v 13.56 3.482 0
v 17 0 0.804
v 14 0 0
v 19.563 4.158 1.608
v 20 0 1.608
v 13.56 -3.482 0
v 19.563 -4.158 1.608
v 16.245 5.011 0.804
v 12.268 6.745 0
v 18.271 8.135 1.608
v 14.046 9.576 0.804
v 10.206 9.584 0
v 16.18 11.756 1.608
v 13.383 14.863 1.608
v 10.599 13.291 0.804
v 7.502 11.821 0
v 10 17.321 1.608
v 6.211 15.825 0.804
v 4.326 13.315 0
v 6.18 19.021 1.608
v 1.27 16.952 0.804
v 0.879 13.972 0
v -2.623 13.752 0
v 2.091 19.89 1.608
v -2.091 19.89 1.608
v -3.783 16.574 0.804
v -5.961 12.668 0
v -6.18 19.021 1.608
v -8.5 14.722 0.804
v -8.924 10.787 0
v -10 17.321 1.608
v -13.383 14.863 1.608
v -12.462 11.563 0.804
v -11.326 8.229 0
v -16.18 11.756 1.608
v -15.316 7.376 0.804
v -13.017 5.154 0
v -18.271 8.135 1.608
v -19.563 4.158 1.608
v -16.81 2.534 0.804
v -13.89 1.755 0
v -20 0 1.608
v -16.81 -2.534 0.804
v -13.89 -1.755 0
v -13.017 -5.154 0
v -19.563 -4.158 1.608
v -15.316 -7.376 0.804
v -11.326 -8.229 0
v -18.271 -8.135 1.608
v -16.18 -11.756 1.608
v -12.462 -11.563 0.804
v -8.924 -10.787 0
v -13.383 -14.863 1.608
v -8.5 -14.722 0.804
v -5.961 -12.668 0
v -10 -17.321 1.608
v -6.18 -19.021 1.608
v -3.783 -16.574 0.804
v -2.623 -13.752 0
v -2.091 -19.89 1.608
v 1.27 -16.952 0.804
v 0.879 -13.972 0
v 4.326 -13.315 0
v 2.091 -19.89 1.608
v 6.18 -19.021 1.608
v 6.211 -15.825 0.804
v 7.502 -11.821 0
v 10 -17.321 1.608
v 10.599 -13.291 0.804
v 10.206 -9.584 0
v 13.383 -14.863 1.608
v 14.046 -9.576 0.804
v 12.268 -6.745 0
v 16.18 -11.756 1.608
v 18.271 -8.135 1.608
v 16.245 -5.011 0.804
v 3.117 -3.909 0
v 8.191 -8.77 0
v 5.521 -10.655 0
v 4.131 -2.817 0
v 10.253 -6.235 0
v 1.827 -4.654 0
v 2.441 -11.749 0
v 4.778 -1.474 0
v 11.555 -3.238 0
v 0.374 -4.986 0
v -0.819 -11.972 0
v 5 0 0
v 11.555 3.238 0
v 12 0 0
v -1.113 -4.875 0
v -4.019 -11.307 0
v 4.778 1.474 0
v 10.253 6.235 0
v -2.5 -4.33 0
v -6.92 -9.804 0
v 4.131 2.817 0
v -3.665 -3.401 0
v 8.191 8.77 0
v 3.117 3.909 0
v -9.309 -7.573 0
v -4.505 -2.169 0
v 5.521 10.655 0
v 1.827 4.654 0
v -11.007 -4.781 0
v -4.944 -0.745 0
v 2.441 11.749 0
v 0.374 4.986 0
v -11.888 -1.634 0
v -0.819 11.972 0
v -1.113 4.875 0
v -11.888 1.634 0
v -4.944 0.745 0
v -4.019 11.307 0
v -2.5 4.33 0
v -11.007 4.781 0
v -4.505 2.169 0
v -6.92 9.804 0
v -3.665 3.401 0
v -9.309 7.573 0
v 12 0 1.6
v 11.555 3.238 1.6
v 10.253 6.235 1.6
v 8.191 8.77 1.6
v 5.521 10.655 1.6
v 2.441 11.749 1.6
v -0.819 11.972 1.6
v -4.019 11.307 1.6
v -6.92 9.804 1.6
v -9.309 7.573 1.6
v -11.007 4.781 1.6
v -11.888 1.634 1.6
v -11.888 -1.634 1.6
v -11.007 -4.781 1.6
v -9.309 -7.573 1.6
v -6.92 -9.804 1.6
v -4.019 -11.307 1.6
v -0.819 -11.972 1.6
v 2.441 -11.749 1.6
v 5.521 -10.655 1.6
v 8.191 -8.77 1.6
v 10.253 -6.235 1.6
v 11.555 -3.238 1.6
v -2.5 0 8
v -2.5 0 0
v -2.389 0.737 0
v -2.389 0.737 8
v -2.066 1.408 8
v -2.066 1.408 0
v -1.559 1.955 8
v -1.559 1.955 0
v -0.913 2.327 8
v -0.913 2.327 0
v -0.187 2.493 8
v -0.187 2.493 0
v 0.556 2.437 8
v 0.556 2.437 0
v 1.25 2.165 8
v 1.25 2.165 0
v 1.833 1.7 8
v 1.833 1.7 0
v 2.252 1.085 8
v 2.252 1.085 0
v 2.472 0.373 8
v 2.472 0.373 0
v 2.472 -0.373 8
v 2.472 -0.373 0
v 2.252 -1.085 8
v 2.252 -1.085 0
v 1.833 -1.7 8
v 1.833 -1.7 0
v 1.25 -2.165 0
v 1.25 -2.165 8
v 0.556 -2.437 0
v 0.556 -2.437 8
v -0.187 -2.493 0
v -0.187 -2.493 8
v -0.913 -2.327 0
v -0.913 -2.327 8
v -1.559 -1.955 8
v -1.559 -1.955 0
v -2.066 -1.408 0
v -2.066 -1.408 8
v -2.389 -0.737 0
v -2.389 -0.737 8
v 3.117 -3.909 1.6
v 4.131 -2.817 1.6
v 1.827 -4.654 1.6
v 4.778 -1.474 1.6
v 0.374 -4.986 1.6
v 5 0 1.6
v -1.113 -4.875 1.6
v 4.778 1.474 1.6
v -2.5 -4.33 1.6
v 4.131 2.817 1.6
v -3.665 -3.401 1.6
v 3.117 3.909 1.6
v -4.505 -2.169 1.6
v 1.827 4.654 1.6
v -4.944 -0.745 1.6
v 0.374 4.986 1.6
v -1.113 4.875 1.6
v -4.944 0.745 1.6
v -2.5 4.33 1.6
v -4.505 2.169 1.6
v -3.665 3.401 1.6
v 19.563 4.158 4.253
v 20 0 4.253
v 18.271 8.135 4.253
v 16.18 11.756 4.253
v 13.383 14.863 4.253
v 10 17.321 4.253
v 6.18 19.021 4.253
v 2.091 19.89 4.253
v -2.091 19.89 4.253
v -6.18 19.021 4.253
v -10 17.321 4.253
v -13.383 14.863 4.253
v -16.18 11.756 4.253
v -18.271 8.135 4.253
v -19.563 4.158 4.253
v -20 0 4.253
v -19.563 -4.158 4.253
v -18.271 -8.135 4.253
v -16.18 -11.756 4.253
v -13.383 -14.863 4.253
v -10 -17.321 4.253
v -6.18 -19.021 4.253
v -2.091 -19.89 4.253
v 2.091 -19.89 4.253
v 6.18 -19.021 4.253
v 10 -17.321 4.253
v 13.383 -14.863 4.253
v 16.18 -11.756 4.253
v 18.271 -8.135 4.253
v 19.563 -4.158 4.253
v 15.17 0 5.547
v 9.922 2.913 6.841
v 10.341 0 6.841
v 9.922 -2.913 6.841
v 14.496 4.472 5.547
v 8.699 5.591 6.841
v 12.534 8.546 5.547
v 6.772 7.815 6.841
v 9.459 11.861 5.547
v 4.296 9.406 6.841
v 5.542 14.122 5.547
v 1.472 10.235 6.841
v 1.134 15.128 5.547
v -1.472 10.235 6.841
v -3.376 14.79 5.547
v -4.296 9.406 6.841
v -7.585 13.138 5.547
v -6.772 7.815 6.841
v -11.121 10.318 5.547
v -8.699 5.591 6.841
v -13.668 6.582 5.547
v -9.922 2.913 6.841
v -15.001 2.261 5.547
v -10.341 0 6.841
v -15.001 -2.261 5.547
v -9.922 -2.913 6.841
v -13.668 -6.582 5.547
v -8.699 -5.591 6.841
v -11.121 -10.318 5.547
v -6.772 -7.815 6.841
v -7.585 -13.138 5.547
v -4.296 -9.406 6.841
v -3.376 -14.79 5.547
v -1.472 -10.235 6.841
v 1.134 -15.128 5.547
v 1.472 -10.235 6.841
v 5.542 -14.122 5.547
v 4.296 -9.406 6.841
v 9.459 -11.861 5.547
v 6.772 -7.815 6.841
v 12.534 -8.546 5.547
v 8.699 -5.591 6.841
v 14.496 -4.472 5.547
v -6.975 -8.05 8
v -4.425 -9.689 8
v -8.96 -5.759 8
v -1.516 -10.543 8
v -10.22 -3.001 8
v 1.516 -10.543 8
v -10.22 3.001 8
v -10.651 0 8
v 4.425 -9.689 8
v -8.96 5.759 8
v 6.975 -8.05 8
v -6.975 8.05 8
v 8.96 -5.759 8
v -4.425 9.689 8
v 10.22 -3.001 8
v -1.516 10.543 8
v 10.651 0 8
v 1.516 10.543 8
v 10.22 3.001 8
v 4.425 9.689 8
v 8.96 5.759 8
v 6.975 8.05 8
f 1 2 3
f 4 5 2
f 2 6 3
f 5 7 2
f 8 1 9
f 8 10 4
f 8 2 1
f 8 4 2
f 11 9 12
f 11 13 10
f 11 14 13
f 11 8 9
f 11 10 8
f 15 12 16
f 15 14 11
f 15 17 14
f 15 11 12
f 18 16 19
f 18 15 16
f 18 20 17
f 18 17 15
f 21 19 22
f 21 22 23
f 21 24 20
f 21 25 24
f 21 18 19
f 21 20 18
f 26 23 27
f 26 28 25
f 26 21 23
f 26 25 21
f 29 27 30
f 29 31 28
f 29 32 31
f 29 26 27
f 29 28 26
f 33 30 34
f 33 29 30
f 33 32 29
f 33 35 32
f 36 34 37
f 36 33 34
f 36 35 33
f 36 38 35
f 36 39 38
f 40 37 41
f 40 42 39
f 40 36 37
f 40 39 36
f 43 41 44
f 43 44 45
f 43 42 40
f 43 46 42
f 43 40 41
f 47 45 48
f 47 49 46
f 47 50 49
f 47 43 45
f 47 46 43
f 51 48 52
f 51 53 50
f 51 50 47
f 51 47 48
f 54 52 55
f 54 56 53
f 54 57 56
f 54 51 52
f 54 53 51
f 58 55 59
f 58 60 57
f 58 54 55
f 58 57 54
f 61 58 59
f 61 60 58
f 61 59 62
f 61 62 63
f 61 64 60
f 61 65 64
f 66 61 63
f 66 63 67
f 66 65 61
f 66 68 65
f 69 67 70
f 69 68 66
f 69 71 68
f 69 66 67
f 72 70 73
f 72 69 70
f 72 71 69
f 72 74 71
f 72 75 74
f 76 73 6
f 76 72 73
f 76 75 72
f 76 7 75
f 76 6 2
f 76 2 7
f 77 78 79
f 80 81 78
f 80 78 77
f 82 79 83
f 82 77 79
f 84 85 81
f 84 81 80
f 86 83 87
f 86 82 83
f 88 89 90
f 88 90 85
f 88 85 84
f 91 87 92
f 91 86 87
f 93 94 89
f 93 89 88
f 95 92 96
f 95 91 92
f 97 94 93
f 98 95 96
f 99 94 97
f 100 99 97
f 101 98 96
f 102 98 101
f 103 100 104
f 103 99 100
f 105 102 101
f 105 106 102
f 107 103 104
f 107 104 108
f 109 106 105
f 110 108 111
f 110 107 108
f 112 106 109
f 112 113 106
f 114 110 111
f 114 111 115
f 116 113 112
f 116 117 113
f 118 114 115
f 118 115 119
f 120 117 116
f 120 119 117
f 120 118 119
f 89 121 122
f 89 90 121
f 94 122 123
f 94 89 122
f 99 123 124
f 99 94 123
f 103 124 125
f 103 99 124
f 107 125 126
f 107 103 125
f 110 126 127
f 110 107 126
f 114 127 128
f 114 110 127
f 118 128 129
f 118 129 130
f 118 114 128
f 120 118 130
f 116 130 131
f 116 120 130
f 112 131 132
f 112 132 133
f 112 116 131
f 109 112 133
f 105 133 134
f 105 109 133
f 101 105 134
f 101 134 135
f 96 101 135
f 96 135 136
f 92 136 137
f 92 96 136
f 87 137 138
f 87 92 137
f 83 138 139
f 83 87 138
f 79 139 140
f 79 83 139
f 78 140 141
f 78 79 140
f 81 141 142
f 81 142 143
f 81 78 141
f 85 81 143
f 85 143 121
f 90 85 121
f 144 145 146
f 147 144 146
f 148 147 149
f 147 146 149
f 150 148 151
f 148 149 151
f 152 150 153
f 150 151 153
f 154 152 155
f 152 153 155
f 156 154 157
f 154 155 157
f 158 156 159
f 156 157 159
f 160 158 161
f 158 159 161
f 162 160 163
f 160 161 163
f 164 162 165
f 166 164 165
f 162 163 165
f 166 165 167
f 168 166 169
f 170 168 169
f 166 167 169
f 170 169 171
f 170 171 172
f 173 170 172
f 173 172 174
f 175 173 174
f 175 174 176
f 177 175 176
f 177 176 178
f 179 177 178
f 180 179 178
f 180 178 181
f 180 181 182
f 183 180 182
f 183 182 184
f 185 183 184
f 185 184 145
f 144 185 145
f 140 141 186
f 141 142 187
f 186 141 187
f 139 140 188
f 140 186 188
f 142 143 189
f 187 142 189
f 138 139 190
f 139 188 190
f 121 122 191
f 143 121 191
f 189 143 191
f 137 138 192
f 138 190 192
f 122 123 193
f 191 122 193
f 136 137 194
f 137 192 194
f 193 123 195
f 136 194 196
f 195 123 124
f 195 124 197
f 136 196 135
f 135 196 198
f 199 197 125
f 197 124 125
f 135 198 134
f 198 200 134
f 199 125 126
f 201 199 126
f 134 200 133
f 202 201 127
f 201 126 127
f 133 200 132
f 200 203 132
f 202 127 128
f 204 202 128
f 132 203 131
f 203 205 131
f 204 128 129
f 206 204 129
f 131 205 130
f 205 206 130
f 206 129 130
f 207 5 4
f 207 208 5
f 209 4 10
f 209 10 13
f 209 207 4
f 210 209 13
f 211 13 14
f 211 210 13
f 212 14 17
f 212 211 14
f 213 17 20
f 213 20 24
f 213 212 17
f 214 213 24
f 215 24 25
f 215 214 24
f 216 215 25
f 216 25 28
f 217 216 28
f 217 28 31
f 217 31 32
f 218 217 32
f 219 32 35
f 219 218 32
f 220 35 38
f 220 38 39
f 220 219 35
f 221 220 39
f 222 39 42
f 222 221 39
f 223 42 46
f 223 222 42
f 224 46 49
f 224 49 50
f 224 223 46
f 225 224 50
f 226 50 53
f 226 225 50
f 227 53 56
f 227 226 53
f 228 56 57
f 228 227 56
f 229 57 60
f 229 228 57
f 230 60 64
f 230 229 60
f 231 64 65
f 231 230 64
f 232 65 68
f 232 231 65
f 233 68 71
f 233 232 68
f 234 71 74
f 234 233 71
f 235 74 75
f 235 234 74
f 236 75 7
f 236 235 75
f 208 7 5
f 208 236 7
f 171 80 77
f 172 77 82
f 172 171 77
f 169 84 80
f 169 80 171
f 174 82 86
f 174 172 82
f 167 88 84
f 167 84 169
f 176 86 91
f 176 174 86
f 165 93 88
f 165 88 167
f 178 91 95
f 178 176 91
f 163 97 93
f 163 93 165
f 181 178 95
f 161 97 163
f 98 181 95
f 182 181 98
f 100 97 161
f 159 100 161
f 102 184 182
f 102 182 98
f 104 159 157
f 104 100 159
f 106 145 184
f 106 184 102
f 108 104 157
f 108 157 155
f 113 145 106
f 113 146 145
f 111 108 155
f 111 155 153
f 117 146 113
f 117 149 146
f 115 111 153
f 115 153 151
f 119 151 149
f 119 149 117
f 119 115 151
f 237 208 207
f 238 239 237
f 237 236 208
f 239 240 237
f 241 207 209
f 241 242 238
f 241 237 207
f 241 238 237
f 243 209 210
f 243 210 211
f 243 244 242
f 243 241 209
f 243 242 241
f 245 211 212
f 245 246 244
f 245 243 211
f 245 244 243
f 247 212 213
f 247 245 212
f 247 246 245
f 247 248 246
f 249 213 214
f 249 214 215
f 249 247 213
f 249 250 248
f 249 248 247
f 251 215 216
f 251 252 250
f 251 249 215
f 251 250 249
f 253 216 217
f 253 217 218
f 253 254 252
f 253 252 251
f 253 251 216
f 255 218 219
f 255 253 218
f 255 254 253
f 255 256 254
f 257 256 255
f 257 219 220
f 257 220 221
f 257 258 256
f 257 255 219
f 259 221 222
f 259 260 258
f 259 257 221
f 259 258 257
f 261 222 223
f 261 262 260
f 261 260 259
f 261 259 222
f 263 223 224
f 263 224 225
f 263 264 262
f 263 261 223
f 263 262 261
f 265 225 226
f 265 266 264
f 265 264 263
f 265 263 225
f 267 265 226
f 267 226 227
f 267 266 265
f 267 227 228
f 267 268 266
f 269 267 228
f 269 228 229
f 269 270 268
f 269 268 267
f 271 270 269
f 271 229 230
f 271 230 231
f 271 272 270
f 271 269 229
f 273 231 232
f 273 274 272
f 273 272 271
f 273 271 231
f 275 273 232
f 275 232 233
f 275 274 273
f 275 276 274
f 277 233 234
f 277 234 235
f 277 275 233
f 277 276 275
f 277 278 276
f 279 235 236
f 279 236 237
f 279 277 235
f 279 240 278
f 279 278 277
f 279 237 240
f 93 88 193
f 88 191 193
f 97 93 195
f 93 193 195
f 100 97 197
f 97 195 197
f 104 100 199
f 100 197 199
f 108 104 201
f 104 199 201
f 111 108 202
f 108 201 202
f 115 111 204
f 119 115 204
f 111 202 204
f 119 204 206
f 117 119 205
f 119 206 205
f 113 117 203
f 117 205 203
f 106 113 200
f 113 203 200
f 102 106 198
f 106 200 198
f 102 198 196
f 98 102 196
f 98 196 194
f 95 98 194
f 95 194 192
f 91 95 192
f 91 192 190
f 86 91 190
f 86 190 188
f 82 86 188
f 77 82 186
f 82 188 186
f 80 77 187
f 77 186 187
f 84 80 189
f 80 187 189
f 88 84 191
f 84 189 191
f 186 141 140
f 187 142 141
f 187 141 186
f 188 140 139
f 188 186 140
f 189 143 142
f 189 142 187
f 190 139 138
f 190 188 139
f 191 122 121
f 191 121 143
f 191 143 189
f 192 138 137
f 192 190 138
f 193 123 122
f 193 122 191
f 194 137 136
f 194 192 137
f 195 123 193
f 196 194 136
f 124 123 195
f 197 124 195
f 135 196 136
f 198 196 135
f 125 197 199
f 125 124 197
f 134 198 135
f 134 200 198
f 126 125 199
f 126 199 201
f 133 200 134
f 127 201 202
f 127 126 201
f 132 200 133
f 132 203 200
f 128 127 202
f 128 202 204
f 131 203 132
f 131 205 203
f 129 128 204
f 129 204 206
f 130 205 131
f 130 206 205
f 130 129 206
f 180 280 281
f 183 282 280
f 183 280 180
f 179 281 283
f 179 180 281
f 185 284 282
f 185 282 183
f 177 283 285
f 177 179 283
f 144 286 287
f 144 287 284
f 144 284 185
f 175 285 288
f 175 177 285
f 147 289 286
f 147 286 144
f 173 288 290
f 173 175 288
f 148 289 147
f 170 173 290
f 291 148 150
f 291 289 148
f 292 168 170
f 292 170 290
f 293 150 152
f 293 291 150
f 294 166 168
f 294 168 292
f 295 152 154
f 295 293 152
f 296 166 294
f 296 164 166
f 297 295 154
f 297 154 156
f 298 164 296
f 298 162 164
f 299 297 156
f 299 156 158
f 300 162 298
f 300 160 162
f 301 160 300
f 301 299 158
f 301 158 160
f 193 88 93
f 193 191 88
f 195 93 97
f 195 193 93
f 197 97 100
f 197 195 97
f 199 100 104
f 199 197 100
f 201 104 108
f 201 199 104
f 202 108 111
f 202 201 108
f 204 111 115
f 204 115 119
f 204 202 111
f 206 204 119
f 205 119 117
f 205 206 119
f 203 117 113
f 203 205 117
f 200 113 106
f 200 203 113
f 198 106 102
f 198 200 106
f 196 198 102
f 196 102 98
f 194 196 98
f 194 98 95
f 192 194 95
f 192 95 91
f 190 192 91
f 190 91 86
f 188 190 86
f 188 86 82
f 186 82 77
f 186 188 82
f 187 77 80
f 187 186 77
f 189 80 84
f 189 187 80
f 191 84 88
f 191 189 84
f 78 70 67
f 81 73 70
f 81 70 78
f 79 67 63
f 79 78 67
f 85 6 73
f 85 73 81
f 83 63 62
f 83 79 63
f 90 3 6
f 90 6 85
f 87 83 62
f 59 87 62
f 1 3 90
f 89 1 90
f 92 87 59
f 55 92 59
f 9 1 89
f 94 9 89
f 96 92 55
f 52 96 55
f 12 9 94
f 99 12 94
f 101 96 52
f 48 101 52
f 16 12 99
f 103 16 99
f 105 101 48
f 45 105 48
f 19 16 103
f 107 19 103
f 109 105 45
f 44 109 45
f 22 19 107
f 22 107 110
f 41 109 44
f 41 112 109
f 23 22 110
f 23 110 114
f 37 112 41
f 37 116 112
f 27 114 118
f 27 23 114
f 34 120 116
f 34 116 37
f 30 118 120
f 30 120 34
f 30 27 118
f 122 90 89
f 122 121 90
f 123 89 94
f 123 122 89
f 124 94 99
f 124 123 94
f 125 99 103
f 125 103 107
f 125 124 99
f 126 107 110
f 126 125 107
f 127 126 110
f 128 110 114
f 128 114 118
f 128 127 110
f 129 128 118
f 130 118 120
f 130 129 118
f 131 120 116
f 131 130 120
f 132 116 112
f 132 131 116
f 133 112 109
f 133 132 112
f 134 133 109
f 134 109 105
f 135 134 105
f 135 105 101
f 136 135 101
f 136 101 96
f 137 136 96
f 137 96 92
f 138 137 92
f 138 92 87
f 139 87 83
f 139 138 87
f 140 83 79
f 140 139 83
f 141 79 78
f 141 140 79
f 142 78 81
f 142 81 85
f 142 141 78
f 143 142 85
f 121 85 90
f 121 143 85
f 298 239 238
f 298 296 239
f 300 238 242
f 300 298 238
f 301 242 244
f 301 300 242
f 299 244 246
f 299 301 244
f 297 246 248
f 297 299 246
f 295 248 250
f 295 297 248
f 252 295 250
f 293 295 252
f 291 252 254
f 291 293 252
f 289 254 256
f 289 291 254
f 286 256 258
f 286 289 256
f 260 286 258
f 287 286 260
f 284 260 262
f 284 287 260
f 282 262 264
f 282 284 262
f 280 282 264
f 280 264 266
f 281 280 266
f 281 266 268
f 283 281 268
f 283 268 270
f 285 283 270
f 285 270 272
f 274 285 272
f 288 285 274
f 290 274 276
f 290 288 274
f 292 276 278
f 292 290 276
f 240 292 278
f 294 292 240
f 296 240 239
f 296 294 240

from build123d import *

# Parameters (mm, degrees)
F0_W   = 7
F0_H   = 1.6
F0_W_2 = 5
F4_D   = 5


with BuildPart() as f1:
    # F0 (on Front) → F1 (revolve)
    with BuildSketch(Plane.XZ):
        with Locations((8.5, 0.8)):
            Rectangle(F0_W, F0_H)
    revolve(axis=Axis((0, 0, 0.8), (0, 0, 1)))


with BuildPart() as f2:
    # F0 (on Front) → F2 (revolve)
    with BuildSketch(Plane.XZ):
        Polygon((0, 8), (0, 1.6), (5, 1.6), (12, 1.6), (12, 0), (14, 0), (20, 1.6076951546), (20, 4.2526985574), (10.3407417371, 6.8408890085), (6.014880625, 8), align=None)
        with Locations((2.5, 0.8)):
            Rectangle(F0_W_2, F0_H)
        Polygon((10.6513245912, 8), (6.014880625, 8), (10.3407417371, 6.8408890085), align=None)
    revolve(axis=Axis((0, 0, 4), (0, 0, 1)))

    # F4 (through all)
    with Locations(Plane.XY.offset(8)):
        with Locations((0, 0)):
            Hole(F4_D / 2)


solid = Compound([f1.part, f2.part])
